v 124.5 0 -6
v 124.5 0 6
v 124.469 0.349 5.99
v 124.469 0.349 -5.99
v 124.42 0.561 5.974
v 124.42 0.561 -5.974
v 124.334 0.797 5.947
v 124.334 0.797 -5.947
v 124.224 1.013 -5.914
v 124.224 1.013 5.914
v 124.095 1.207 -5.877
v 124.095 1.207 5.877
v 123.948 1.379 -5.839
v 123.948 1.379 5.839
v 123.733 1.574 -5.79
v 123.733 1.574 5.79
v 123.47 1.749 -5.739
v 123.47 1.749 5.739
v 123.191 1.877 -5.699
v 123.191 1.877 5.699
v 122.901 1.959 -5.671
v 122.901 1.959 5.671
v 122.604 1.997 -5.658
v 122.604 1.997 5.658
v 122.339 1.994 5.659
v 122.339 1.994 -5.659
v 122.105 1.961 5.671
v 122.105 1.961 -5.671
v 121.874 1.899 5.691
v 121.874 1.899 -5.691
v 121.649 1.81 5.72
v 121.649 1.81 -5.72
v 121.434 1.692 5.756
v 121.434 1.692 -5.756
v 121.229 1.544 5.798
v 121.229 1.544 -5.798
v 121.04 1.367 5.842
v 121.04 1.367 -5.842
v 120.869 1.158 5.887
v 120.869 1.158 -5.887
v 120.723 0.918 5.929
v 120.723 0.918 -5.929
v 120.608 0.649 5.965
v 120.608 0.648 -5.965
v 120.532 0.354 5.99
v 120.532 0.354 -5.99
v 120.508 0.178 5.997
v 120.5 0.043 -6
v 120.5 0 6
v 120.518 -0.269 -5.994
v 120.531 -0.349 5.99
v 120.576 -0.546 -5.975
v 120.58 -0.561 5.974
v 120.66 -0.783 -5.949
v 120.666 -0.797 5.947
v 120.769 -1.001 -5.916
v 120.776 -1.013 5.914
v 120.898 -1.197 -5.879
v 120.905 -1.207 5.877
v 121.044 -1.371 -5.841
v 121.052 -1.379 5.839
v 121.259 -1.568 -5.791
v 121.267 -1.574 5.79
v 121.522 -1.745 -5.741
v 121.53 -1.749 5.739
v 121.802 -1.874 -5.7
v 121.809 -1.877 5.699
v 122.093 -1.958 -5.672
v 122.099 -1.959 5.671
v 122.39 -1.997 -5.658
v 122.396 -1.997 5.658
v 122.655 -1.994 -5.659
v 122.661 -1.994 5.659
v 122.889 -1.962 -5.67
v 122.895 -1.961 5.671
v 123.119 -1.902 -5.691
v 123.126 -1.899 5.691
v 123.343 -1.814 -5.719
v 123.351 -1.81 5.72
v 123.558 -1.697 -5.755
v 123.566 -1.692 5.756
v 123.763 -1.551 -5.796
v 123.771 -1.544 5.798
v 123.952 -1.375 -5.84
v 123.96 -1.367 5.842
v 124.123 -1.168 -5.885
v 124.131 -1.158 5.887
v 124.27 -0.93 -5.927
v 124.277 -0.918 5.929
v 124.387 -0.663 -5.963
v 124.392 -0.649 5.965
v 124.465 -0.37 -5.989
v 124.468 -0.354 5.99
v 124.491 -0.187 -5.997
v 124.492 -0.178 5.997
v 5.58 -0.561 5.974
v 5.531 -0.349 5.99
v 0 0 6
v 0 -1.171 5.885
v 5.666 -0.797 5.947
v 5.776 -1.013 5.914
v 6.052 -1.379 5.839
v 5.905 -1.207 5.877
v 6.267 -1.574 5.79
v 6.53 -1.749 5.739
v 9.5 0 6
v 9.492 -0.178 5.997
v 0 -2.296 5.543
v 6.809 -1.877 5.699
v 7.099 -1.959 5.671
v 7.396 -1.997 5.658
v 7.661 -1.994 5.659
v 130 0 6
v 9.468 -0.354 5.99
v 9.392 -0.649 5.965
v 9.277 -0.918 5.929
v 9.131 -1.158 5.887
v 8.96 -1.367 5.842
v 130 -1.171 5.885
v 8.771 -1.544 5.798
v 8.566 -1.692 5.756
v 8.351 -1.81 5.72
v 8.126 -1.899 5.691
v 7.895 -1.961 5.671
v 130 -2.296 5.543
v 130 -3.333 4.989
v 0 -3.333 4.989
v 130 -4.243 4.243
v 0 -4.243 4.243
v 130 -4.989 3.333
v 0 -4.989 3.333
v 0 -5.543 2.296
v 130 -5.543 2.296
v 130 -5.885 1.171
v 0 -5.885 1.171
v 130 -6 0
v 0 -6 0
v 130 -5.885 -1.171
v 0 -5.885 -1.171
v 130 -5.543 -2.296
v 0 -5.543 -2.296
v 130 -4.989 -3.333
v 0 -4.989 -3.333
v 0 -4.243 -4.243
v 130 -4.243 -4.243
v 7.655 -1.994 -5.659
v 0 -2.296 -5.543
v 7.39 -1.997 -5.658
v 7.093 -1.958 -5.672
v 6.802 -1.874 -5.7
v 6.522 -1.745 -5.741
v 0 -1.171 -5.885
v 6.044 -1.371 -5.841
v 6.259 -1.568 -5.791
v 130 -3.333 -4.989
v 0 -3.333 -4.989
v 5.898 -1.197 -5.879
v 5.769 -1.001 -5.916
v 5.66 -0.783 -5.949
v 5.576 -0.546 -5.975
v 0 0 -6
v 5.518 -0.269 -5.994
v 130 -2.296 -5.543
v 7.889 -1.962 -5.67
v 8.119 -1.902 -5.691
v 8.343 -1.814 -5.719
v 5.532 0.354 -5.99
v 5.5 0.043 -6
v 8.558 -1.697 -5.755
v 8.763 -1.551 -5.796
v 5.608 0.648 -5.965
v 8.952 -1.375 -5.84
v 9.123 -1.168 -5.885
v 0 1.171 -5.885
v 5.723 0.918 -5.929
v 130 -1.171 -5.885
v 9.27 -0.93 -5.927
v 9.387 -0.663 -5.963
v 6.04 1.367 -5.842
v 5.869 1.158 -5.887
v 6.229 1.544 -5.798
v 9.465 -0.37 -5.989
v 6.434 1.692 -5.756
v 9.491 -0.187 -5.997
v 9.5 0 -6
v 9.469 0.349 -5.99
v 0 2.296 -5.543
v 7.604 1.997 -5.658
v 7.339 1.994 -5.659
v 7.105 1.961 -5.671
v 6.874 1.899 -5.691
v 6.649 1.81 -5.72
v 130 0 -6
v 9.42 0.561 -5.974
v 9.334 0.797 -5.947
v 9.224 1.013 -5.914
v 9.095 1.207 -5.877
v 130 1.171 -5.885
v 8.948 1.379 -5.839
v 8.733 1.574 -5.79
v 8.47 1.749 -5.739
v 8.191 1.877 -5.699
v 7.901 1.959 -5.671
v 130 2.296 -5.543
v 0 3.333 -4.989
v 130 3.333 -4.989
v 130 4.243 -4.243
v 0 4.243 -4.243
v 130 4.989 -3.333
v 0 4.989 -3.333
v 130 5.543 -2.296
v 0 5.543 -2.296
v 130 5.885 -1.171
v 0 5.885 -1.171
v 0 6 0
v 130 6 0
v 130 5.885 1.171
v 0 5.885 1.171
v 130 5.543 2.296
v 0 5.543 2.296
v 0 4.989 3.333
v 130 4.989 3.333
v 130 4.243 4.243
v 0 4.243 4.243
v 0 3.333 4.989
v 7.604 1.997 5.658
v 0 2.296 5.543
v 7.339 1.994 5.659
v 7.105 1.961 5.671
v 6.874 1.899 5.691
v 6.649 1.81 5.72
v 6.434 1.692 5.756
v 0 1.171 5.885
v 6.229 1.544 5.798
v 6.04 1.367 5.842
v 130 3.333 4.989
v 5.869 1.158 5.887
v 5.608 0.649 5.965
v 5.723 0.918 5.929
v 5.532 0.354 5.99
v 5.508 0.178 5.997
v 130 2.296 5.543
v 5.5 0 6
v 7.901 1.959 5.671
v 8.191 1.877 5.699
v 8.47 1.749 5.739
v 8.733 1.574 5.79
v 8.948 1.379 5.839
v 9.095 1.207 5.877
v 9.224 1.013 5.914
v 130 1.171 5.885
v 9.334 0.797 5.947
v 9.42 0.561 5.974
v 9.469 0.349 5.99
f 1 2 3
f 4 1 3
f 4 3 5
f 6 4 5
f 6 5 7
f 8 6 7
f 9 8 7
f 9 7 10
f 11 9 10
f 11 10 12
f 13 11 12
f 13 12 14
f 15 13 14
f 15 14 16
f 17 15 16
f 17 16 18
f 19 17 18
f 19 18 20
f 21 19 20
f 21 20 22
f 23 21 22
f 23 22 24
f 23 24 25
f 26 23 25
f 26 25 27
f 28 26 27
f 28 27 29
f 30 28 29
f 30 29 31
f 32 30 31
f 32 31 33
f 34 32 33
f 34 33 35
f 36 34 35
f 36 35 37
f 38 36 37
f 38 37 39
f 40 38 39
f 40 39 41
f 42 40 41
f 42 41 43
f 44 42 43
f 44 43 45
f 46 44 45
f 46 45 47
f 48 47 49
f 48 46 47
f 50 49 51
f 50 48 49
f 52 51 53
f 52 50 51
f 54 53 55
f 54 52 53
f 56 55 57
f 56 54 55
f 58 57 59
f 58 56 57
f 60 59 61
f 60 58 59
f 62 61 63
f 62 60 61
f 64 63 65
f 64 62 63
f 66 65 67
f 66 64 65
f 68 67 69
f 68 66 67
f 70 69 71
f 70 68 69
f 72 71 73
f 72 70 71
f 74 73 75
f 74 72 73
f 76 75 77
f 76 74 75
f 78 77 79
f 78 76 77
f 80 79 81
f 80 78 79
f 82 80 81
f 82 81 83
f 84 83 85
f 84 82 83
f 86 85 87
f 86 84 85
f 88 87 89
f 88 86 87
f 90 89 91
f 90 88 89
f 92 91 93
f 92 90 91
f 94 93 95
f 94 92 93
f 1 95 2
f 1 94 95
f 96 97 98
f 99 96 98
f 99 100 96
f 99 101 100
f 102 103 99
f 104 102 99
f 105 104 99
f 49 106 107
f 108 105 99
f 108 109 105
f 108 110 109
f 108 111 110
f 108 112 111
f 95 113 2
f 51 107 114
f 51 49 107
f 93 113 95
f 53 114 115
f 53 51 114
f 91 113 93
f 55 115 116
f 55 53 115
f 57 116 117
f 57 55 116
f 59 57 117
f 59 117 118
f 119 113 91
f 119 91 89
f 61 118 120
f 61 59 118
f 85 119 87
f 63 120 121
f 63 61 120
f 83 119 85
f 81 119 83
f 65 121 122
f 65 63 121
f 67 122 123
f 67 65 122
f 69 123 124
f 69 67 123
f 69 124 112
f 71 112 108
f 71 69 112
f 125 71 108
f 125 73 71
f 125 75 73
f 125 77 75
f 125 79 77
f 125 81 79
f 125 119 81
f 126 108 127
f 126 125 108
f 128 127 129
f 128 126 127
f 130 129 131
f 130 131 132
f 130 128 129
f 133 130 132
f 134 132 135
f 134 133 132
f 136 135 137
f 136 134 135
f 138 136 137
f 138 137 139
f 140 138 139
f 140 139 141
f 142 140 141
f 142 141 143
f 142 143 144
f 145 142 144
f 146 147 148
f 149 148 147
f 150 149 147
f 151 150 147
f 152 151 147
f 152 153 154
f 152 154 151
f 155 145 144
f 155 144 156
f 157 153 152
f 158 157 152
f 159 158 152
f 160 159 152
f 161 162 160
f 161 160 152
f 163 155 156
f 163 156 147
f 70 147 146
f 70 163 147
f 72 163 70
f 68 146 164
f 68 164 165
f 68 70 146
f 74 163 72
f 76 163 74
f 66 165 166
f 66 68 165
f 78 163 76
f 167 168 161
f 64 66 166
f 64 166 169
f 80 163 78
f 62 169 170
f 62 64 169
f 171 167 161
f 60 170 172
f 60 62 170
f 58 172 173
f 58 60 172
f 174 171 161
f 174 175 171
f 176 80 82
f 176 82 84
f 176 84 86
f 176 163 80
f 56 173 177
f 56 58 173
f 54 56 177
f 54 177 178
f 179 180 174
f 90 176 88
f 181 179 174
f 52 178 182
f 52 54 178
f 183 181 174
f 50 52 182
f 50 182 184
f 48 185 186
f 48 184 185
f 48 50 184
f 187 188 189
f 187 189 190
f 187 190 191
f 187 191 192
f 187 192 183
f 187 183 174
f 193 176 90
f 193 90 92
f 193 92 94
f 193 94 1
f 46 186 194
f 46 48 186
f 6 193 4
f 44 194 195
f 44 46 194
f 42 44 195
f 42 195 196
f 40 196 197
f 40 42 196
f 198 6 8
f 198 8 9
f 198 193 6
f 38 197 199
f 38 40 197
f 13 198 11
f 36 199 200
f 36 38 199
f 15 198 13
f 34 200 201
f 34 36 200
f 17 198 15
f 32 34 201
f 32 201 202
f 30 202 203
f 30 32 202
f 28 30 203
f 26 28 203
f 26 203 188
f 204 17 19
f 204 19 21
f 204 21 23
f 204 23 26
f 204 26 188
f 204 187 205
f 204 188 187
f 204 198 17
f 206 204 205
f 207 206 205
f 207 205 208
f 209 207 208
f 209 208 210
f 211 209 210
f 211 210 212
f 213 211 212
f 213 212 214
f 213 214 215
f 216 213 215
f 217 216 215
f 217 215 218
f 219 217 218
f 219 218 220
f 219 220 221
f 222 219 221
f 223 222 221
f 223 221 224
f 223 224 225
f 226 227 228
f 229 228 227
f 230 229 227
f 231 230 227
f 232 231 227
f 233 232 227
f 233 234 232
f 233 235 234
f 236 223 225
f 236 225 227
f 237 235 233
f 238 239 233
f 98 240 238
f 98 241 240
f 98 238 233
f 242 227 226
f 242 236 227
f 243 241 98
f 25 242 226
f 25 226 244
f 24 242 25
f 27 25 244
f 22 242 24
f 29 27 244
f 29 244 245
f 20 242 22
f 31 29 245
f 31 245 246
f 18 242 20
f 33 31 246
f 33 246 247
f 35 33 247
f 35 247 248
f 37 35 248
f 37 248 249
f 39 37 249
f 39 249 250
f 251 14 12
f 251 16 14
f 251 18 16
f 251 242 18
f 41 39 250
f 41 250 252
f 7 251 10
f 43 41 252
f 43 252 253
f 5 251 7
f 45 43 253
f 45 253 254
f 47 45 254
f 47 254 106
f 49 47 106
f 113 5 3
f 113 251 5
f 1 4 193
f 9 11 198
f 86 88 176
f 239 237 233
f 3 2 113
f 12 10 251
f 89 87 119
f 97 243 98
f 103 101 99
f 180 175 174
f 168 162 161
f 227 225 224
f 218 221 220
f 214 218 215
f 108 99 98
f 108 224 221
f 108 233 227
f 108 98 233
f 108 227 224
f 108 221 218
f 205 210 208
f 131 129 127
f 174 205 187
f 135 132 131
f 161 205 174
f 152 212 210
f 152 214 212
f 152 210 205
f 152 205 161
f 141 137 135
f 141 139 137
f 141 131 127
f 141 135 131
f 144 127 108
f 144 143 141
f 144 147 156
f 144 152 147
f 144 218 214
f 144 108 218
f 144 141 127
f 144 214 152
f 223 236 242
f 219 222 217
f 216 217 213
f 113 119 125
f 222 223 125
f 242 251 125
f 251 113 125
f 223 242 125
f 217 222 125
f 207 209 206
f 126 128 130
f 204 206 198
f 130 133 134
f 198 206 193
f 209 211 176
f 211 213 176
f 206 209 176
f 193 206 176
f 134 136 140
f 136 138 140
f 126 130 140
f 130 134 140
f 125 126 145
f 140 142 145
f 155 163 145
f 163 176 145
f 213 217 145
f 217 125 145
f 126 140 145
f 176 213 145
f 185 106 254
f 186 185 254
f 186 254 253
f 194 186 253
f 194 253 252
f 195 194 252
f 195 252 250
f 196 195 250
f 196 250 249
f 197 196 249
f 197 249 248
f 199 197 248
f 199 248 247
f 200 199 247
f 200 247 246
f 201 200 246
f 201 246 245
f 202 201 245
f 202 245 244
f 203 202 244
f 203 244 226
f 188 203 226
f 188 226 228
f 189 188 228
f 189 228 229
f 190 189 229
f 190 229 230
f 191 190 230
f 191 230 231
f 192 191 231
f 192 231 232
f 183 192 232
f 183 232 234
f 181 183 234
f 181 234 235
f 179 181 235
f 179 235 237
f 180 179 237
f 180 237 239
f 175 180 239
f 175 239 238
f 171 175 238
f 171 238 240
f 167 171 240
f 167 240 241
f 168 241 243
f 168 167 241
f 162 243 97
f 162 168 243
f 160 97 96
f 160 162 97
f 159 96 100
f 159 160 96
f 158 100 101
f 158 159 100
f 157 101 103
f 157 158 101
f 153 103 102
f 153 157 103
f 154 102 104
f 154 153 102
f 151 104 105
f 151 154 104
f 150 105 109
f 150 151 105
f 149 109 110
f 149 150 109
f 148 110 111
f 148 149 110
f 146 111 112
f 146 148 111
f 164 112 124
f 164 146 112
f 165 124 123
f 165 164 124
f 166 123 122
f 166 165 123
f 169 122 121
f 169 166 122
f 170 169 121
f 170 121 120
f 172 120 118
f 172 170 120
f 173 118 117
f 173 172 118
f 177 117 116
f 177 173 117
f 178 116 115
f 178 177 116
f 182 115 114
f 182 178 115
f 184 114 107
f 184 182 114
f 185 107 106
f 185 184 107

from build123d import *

# Parameters (mm, degrees)
SKETCH1_W               = 130
SKETCH1_H               = 6
CUT_EXTRUDE6_DEPTH      = 131.276628756
CUT_EXTRUDE6_DEPTH_BACK = 131.276628756
SKETCH2_R               = 2
CUT_EXTRUDE7_DEPTH      = 131.276628865
CUT_EXTRUDE7_DEPTH_BACK = 131.276628865
SKETCH2_7_R             = 2


with BuildPart() as part:
    # Sketch1 → Revolve1 (revolve)
    with BuildSketch(Plane.XY):
        with Locations((65, 3)):
            Rectangle(SKETCH1_W, SKETCH1_H)
    revolve(axis=Axis((0, 0, 0), (1, 0, 0)))

    # Sketch2 → Cut-Extrude6 (cut, two sides: drawn at the far end of the back side and taken through both)
    with BuildSketch(Plane.XY.offset(-CUT_EXTRUDE6_DEPTH_BACK)):
        with Locations((7.5, 0)):
            Circle(SKETCH2_R)
    extrude(amount=CUT_EXTRUDE6_DEPTH + CUT_EXTRUDE6_DEPTH_BACK, mode=Mode.SUBTRACT)

    # Sketch2<7> → Cut-Extrude7 (cut, two sides: drawn at the far end of the back side and taken through both)
    with BuildSketch(Plane.XY.offset(-CUT_EXTRUDE7_DEPTH_BACK)):
        with Locations((122.5, 0)):
            Circle(SKETCH2_7_R)
    extrude(amount=CUT_EXTRUDE7_DEPTH + CUT_EXTRUDE7_DEPTH_BACK, mode=Mode.SUBTRACT)


solid = part.part
